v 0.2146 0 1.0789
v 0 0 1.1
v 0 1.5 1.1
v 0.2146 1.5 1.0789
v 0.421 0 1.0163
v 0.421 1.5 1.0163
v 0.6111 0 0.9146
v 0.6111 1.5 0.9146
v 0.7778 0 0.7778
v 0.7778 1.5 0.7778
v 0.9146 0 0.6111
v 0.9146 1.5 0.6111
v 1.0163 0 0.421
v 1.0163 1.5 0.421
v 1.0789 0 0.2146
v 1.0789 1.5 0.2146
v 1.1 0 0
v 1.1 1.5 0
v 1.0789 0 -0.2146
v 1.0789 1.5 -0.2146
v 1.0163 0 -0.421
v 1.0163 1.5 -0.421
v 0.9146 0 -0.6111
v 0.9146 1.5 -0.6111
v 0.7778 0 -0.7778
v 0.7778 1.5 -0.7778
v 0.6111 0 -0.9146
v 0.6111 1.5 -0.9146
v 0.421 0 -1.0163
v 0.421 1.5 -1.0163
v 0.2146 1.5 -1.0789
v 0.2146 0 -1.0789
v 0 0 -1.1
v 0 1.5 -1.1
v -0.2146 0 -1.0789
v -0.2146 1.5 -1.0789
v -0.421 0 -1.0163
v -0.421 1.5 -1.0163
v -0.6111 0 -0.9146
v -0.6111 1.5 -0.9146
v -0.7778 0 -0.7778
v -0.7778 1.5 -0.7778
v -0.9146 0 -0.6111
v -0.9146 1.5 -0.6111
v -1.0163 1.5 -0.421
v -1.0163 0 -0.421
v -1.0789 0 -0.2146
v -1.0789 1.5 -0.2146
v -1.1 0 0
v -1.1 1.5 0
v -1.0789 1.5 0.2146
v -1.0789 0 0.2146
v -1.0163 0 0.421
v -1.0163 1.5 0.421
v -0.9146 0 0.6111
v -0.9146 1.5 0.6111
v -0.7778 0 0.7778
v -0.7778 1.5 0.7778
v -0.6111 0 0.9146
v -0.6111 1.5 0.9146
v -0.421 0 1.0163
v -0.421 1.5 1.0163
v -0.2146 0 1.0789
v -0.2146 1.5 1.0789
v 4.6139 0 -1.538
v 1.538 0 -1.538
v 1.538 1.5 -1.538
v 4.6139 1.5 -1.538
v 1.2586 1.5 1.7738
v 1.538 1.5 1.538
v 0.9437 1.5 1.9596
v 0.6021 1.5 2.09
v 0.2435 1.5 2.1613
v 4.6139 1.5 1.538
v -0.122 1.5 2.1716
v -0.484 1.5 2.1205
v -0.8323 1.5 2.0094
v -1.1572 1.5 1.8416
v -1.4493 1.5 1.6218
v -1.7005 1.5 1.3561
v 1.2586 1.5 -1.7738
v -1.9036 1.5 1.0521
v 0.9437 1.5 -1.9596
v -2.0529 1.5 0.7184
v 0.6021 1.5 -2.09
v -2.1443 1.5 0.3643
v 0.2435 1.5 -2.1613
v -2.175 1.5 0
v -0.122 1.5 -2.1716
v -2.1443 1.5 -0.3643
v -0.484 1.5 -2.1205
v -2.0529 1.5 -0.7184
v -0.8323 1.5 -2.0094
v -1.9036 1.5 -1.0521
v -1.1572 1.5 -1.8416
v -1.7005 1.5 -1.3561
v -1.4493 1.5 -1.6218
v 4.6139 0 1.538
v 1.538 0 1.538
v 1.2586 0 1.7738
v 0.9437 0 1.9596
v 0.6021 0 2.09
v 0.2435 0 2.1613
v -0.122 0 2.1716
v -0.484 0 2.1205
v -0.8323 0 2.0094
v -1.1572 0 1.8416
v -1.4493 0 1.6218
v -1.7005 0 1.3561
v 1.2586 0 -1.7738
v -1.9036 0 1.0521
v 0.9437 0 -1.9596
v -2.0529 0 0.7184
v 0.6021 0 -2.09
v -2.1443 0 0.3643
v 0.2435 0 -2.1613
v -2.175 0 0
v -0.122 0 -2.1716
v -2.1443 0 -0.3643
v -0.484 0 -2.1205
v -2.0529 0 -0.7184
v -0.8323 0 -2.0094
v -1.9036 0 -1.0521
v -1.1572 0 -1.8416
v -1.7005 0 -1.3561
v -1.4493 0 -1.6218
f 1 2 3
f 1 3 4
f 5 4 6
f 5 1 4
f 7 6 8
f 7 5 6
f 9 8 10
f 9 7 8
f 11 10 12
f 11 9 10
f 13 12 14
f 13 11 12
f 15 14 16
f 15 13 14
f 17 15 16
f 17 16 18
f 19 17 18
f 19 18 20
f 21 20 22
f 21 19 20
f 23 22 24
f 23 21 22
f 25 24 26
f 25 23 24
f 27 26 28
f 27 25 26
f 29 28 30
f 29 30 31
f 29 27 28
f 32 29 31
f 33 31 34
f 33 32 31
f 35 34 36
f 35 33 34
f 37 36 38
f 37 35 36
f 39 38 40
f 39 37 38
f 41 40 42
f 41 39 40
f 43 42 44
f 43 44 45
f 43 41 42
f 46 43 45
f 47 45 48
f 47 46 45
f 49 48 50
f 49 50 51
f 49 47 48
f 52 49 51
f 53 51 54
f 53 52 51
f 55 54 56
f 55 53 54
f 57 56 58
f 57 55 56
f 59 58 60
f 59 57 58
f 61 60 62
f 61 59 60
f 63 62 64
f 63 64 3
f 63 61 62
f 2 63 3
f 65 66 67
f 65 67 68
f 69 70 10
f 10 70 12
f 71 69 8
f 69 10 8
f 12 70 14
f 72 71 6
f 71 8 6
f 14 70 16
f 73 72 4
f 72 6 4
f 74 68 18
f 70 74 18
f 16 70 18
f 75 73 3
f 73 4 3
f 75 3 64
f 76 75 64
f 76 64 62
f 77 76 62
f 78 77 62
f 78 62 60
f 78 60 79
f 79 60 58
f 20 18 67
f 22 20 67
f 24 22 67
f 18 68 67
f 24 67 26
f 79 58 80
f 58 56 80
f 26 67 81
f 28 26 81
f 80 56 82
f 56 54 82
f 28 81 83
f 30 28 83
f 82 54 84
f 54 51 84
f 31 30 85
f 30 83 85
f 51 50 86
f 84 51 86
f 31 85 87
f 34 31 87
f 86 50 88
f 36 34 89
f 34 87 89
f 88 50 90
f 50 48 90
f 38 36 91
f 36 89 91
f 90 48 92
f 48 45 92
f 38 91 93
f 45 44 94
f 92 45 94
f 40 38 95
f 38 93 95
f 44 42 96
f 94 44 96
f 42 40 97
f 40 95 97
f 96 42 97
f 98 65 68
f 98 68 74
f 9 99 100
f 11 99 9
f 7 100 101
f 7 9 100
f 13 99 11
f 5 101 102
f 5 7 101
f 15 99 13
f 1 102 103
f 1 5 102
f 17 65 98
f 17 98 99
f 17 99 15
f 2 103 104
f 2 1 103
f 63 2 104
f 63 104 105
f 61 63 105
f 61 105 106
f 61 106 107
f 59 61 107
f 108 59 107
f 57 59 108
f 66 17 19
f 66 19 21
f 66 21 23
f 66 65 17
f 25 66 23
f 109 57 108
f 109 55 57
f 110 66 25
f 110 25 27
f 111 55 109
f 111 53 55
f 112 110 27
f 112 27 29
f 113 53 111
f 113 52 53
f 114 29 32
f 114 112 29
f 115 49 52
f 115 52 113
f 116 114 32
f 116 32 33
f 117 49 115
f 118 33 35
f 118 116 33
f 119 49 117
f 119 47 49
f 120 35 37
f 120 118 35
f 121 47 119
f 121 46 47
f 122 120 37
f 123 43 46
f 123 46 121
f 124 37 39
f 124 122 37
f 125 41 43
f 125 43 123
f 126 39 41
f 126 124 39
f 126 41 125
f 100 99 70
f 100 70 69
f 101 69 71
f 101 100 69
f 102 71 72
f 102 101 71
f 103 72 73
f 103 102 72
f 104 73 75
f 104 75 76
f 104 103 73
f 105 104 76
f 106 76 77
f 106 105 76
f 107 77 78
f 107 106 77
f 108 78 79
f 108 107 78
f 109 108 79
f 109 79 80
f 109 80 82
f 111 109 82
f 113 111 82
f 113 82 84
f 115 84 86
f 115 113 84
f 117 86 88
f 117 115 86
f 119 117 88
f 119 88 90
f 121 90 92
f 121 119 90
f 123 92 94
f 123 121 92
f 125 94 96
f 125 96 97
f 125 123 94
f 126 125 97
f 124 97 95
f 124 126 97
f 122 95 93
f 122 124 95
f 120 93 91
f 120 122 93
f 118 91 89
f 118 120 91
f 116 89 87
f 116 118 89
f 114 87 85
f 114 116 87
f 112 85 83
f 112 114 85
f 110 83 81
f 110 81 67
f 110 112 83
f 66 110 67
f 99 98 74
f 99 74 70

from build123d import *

# Parameters (mm, degrees)
SKETCH_2_R      = 1.1
EXTRUDE_1_DEPTH = 1.5


with BuildPart() as part:
    # 草图2 → 凸台-拉伸1 (new body)
    with BuildSketch(Plane(origin=(0, 0, 0), x_dir=(1, 0, 0), z_dir=(0, 1, 0))):
        with BuildLine():
            Line((1.537957249, 1.537957249), (4.613871747, 1.537957249))
            Line((4.613871747, 1.537957249), (4.613871747, -1.537957249))
            Line((4.613871747, -1.537957249), (1.537957249, -1.537957249))
            ThreePointArc((1.537957249, -1.537957249), (-2.175, 0), (1.537957249, 1.537957249))
        make_face()
        with Locations(Location((0, 0, 0), (0, 0, 270))):
            Circle(SKETCH_2_R, mode=Mode.SUBTRACT)
    extrude(amount=EXTRUDE_1_DEPTH)


solid = part.part
